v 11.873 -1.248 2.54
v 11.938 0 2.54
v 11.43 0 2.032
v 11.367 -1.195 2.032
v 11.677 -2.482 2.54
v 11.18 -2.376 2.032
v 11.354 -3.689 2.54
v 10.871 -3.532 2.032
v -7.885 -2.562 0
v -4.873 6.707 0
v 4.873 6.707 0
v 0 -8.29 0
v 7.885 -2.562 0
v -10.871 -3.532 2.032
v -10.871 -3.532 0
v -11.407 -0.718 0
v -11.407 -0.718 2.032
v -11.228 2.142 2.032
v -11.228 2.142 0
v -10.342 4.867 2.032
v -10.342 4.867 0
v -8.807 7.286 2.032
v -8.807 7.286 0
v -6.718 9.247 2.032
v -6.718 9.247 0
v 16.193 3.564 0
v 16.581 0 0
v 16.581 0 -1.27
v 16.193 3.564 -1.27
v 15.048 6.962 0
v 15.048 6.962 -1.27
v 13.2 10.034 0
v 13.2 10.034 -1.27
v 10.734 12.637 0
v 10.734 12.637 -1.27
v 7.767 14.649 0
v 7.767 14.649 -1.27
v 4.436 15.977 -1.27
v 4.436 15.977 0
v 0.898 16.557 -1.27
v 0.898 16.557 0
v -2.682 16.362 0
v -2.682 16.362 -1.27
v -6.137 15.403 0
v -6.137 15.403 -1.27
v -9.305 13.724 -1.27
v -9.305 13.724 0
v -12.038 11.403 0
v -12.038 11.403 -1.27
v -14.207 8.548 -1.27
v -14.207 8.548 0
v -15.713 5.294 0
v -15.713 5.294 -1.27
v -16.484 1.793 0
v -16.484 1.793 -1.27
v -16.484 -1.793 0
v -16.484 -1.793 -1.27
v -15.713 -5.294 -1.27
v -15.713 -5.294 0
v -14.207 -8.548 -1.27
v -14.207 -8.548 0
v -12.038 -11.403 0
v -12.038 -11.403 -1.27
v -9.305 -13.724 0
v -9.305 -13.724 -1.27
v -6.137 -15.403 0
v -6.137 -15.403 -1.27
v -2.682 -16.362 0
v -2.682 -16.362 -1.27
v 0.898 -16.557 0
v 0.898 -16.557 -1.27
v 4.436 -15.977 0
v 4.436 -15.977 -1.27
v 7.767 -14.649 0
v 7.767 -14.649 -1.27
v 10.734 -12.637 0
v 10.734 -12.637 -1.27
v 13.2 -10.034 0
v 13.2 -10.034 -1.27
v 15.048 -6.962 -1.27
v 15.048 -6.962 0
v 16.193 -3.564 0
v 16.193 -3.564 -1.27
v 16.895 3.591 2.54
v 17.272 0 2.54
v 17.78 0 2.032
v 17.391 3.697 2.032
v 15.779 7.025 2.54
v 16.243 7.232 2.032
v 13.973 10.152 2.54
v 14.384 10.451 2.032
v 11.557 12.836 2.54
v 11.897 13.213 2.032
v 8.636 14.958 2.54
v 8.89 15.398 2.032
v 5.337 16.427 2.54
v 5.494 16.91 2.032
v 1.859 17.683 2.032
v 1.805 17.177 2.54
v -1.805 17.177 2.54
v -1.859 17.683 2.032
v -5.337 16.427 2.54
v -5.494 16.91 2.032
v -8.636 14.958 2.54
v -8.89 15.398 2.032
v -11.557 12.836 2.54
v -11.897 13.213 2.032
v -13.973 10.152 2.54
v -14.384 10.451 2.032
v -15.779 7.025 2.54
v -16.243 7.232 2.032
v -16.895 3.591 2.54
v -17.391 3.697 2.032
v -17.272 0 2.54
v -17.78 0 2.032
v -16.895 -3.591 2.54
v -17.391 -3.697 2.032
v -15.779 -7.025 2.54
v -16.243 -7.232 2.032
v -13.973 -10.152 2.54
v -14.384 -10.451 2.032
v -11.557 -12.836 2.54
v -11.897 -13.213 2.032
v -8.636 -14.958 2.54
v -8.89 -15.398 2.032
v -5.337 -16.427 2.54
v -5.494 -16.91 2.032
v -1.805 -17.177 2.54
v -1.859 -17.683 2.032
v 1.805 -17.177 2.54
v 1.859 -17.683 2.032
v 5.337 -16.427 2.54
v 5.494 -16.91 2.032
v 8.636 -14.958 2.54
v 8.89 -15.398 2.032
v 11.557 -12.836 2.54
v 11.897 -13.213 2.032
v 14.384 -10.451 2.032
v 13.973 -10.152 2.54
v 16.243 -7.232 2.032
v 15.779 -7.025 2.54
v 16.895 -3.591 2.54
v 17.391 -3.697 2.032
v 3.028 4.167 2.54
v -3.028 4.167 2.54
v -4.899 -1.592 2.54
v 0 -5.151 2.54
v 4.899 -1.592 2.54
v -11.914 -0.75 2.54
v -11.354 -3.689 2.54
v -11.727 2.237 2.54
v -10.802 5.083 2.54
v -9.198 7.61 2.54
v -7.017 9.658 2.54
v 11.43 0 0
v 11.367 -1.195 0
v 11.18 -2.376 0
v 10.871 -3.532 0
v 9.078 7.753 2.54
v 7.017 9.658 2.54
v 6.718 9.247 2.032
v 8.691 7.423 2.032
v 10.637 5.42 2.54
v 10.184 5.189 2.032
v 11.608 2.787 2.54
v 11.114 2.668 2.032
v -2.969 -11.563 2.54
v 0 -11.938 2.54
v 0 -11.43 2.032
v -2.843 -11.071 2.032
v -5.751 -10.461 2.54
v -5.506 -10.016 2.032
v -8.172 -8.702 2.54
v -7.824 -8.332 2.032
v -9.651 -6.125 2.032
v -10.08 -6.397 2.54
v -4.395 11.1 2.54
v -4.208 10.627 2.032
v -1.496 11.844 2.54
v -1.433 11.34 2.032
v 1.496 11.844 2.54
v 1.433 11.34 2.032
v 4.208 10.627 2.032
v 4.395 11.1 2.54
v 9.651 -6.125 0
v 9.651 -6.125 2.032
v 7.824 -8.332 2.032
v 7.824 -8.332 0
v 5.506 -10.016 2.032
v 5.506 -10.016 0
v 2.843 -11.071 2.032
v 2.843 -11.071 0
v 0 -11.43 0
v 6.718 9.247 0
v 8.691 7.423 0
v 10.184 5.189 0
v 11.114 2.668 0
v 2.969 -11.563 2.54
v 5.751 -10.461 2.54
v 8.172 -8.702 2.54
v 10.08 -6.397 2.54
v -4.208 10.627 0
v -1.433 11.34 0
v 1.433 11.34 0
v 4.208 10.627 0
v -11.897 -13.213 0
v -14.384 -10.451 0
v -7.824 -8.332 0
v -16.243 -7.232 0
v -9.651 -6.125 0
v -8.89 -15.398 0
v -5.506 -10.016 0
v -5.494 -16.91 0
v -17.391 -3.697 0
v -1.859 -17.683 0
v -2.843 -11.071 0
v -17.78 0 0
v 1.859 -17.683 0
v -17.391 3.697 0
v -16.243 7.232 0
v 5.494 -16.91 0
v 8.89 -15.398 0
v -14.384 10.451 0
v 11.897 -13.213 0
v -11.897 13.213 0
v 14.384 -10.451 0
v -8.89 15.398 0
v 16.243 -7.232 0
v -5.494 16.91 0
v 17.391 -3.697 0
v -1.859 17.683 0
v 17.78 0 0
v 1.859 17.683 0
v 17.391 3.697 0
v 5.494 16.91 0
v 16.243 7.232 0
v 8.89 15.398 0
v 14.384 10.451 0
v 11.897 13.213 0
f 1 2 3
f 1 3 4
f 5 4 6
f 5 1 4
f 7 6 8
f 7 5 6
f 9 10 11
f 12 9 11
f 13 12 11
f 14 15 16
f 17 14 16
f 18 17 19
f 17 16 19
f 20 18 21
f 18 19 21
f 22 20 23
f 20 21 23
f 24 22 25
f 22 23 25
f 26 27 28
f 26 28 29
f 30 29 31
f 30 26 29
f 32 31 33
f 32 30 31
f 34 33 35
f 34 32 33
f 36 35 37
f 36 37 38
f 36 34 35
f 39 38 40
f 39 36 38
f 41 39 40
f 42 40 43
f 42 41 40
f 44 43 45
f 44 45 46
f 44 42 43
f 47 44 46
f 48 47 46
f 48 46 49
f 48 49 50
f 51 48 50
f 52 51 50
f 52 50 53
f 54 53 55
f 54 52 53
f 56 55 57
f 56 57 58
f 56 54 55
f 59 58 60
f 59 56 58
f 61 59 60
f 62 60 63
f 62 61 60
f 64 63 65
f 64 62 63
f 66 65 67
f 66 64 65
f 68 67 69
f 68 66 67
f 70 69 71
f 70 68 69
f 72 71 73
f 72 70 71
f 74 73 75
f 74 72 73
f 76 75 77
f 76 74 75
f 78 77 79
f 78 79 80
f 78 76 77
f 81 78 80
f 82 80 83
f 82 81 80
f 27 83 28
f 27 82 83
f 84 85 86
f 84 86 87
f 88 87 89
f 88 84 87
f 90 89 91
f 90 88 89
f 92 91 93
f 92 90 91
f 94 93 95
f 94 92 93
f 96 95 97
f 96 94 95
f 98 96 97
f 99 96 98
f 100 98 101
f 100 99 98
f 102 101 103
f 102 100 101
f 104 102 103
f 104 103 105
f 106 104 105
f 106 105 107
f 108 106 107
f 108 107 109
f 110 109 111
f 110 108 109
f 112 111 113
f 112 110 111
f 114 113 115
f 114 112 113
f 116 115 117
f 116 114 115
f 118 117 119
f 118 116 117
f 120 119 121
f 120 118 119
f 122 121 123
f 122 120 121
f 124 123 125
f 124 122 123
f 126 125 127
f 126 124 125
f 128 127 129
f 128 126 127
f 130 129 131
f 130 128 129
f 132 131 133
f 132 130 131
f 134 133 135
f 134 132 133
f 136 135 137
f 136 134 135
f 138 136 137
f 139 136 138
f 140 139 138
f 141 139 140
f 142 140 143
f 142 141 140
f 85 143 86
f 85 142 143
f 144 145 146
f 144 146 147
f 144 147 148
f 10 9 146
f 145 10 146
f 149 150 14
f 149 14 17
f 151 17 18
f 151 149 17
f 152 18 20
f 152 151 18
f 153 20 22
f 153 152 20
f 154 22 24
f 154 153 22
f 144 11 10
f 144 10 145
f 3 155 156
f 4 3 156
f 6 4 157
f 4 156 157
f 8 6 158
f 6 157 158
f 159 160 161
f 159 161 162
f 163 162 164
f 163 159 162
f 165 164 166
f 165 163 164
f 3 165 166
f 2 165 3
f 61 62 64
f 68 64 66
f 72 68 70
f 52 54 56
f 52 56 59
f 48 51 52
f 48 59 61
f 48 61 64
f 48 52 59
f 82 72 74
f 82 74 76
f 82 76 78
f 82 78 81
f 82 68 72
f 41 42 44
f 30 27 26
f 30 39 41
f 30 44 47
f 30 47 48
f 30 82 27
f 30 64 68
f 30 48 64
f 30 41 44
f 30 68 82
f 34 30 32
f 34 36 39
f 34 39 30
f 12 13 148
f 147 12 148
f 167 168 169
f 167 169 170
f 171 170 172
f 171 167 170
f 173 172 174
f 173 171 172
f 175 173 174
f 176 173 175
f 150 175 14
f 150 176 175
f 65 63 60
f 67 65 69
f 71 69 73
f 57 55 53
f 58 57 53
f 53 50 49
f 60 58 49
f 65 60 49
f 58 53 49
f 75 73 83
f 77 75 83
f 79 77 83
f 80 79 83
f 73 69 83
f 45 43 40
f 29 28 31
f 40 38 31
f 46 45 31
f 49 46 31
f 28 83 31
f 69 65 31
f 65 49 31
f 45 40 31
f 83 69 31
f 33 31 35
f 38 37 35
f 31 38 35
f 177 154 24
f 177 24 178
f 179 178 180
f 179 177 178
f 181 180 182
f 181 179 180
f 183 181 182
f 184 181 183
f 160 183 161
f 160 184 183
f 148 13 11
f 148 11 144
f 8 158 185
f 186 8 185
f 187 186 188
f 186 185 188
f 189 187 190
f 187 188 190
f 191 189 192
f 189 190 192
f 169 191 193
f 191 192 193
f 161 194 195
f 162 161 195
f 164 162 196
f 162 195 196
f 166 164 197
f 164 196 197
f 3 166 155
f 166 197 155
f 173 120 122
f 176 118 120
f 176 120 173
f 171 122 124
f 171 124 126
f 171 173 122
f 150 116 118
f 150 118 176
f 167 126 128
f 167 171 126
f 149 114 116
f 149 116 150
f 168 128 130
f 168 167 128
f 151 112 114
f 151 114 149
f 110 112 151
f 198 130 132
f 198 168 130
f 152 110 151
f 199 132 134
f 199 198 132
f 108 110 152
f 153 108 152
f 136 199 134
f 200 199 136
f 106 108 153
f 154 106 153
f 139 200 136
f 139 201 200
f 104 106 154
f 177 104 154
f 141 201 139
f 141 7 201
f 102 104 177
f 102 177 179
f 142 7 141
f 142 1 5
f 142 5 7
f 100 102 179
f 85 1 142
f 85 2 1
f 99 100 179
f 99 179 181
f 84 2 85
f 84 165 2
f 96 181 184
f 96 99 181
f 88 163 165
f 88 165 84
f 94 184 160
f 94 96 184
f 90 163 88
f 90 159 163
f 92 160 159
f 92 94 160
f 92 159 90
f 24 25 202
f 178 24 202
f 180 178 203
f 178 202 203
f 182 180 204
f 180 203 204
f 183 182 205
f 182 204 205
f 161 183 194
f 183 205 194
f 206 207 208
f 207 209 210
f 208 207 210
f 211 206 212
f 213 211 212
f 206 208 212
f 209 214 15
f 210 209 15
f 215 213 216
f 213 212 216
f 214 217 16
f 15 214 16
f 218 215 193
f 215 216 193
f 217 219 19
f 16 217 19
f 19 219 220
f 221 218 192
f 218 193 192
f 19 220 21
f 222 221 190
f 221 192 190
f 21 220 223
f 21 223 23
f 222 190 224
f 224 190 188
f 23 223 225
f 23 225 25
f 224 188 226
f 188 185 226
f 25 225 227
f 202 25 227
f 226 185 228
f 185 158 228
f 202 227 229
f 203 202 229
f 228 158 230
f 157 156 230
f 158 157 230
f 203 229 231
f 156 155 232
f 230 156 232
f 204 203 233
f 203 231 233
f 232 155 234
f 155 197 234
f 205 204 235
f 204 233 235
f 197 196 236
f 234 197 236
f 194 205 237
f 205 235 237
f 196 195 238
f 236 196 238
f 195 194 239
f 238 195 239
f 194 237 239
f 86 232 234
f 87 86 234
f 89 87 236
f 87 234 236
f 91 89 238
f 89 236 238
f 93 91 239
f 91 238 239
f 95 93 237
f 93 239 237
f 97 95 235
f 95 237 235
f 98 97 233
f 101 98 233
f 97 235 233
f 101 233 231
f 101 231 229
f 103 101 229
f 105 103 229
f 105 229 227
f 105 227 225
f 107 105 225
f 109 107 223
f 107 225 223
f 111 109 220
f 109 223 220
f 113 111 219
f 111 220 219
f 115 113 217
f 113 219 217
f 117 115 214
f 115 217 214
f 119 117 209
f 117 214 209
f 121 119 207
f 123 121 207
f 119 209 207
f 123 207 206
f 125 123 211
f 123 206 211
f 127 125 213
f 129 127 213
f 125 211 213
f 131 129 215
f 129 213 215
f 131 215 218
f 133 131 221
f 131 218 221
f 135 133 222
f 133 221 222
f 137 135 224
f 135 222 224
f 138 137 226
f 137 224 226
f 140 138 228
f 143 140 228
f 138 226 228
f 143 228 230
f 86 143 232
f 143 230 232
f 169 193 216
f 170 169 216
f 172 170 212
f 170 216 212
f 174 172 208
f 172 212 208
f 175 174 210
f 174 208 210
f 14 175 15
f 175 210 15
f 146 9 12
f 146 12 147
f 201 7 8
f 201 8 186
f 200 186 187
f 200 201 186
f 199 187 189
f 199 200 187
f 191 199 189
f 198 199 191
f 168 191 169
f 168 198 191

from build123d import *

# Parameters (mm, degrees)
F0_R        = 17.78
F1_DEPTH    = 2.54
F2_SIZE     = 0.508
F3_T1_DEPTH = 39.5650700251
F3_T3_DEPTH = 39.5650700251
F3_T5_DEPTH = 39.5650700251
F3_T7_DEPTH = 39.5650700251
F3_T9_DEPTH = 39.5650700251
F4_R        = 16.580892073
F5_DEPTH    = 1.27


# Not quite as in the source:
# - a fillet or chamfer that OpenCascade refuses, or shapes differently, is made with other operations: its cross-section is extruded or revolved along the edge and cut away or added


with BuildPart() as f1:
    # F0 (on Top) → F1 (new body)
    with BuildSketch(Plane.XY):
        Circle(F0_R)
        with BuildLine():
            ThreePointArc((6.7183854337, 9.2470642457), (10.1842045715, 5.189111412), (11.43, 0))
            ThreePointArc((11.43, 0), (11.289277733, -1.7880459354), (10.8705759813, -3.5320642457))
            ThreePointArc((10.8705759813, -3.5320642457), (6.7183854337, -9.2470642457), (0, -11.43))
            ThreePointArc((0, -11.43), (-6.7183854337, -9.2470642457), (-10.8705759813, -3.5320642457))
            ThreePointArc((-10.8705759813, -3.5320642457), (-10.8705759813, 3.5320642457), (-6.7183854337, 9.2470642457))
            ThreePointArc((-6.7183854337, 9.2470642457), (0, 11.43), (6.7183854337, 9.2470642457))
        make_face(mode=Mode.SUBTRACT)
    extrude(amount=F1_DEPTH)

    # F2
    f2_edges = [f1.edges().sort_by_distance(p)[0] for p in [
        (-17.78, 0, 2.54),
        (0, 11.43, 2.54),
    ]]
    chamfer(f2_edges, length=F2_SIZE)


with BuildPart() as f1b:
    # F0 (on Top) → F1, piece 2 (new body)
    with BuildSketch(Plane.XY):
        Polygon((10.8705759813, -3.5320642457), (6.7183854337, 9.2470642457), (-6.7183854337, 9.2470642457), (-10.8705759813, -3.5320642457), (0, -11.43), align=None)
    extrude(amount=F1_DEPTH)

    # F3: chamfer of 5.08 on 5 edges, made by hand

    # F3_s2 → F3_t1 (cut)
    with BuildSketch(Plane(origin=(-16.004407017, 11.6278823333, 0), x_dir=(0, 0, 1), z_dir=(0.8090169944, -0.5877852523, 0))):
        Polygon((-2.54, 9.2470642457), (2.54, 4.1670642457), (2.54, 9.2470642457), align=None)
    extrude(amount=F3_T1_DEPTH, mode=Mode.SUBTRACT)

    # F3_s4 → F3_t3 (cut)
    with BuildSketch(Plane(origin=(-16.004407017, -11.6278823333, 0), x_dir=(0, 0, 1), z_dir=(0.8090169944, 0.5877852523, 0))):
        Polygon((-2.54, 9.2470642457), (2.54, 4.1670642457), (2.54, 9.2470642457), align=None)
    extrude(amount=F3_T3_DEPTH, mode=Mode.SUBTRACT)

    # F3_s6 → F3_t5 (cut)
    with BuildSketch(Plane(origin=(6.1131395107, -18.8143088325, 0), x_dir=(0, 0, 1), z_dir=(-0.3090169944, 0.9510565163, 0))):
        Polygon((-2.54, 9.2470642457), (2.54, 4.1670642457), (2.54, 9.2470642457), align=None)
    extrude(amount=F3_T5_DEPTH, mode=Mode.SUBTRACT)

    # F3_s8 → F3_t7 (cut)
    with BuildSketch(Plane.YZ.offset(-19.7825350126)):
        Polygon((9.2470642457, -2.54), (4.1670642457, 2.54), (9.2470642457, 2.54), align=None)
    extrude(amount=F3_T7_DEPTH, mode=Mode.SUBTRACT)

    # F3_s10 → F3_t9 (cut)
    with BuildSketch(Plane(origin=(6.1131395107, 18.8143088325, 0), x_dir=(0, 0, 1), z_dir=(-0.3090169944, -0.9510565163, 0))):
        Polygon((-2.54, 9.2470642457), (2.54, 4.1670642457), (2.54, 9.2470642457), align=None)
    extrude(amount=F3_T9_DEPTH, mode=Mode.SUBTRACT)


with BuildPart() as f5:
    # F4 (on Top) → F5 (new body)
    with BuildSketch(Plane.XY):
        Circle(F4_R)
    extrude(amount=-F5_DEPTH)


solid = Compound([f1.part, f1b.part, f5.part])
